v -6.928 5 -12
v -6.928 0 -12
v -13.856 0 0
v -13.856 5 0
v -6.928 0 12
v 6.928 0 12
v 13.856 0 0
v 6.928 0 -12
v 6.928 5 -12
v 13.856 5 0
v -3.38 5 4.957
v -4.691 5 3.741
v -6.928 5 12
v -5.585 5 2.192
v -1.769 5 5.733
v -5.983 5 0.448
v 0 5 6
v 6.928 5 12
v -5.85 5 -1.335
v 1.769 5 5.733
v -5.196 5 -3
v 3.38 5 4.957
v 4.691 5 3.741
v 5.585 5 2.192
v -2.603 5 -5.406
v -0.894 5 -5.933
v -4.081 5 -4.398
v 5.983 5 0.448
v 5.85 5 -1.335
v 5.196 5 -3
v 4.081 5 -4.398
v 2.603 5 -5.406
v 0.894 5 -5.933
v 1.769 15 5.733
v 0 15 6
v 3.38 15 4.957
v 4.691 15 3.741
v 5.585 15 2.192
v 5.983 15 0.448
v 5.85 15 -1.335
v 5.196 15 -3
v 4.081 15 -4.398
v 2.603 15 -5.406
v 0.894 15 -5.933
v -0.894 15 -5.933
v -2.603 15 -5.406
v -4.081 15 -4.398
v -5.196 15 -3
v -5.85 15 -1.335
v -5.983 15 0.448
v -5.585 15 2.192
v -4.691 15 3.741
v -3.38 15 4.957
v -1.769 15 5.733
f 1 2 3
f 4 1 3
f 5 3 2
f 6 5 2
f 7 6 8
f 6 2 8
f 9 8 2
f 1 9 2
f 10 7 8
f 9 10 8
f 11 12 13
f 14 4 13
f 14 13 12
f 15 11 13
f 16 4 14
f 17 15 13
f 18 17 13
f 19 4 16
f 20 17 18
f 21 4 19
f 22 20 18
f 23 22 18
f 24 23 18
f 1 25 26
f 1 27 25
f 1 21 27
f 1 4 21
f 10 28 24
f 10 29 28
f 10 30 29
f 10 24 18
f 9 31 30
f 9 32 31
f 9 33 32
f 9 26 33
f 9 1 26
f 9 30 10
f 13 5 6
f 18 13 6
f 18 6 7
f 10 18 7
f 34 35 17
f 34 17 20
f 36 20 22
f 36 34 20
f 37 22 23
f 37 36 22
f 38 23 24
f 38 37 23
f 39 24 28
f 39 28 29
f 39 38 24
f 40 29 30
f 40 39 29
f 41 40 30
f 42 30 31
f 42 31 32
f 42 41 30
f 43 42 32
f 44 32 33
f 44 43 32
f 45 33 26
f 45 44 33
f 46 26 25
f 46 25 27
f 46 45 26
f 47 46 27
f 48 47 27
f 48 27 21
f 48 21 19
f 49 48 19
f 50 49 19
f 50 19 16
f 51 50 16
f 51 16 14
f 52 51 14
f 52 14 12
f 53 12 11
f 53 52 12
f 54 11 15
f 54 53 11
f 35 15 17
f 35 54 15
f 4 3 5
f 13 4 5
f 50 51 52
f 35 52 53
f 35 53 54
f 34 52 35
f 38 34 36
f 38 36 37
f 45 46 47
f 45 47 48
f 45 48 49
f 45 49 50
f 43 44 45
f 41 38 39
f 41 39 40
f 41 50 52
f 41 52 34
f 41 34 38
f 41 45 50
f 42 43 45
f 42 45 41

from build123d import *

# Parameters (mm, degrees)
EXTRUDE_1_DEPTH     = 15
SKETCH_2_OUTSIDE_W  = 37.634
SKETCH_2_OUTSIDE_H  = 33.922
SKETCH_2_OUTSIDE_R  = 6
CUT_EXTRUDE_1_DEPTH = 10


with BuildPart() as part:
    # Эскиз1 → Бобышка-Вытянуть1 (new body)
    with BuildSketch(Plane(origin=(0, 0, 0), x_dir=(1, 0, 0), z_dir=(0, 1, 0))):
        Polygon((13.856406461, 0), (6.92820323, 12), (-6.92820323, 12), (-13.856406461, 0), (-6.92820323, -12), (6.92820323, -12), align=None)
    extrude(amount=EXTRUDE_1_DEPTH)

    # Эскиз2 outside → Вырез-Вытянуть1 (cut)
    with BuildSketch(Plane(origin=(0, 15, 0), x_dir=(1, 0, 0), z_dir=(0, 1, 0))):
        Rectangle(SKETCH_2_OUTSIDE_W, SKETCH_2_OUTSIDE_H)
        with Locations(Location((0, 0, 0), (0, 0, 270))):
            Circle(SKETCH_2_OUTSIDE_R, mode=Mode.SUBTRACT)
    extrude(amount=-CUT_EXTRUDE_1_DEPTH, mode=Mode.SUBTRACT)


solid = part.part
